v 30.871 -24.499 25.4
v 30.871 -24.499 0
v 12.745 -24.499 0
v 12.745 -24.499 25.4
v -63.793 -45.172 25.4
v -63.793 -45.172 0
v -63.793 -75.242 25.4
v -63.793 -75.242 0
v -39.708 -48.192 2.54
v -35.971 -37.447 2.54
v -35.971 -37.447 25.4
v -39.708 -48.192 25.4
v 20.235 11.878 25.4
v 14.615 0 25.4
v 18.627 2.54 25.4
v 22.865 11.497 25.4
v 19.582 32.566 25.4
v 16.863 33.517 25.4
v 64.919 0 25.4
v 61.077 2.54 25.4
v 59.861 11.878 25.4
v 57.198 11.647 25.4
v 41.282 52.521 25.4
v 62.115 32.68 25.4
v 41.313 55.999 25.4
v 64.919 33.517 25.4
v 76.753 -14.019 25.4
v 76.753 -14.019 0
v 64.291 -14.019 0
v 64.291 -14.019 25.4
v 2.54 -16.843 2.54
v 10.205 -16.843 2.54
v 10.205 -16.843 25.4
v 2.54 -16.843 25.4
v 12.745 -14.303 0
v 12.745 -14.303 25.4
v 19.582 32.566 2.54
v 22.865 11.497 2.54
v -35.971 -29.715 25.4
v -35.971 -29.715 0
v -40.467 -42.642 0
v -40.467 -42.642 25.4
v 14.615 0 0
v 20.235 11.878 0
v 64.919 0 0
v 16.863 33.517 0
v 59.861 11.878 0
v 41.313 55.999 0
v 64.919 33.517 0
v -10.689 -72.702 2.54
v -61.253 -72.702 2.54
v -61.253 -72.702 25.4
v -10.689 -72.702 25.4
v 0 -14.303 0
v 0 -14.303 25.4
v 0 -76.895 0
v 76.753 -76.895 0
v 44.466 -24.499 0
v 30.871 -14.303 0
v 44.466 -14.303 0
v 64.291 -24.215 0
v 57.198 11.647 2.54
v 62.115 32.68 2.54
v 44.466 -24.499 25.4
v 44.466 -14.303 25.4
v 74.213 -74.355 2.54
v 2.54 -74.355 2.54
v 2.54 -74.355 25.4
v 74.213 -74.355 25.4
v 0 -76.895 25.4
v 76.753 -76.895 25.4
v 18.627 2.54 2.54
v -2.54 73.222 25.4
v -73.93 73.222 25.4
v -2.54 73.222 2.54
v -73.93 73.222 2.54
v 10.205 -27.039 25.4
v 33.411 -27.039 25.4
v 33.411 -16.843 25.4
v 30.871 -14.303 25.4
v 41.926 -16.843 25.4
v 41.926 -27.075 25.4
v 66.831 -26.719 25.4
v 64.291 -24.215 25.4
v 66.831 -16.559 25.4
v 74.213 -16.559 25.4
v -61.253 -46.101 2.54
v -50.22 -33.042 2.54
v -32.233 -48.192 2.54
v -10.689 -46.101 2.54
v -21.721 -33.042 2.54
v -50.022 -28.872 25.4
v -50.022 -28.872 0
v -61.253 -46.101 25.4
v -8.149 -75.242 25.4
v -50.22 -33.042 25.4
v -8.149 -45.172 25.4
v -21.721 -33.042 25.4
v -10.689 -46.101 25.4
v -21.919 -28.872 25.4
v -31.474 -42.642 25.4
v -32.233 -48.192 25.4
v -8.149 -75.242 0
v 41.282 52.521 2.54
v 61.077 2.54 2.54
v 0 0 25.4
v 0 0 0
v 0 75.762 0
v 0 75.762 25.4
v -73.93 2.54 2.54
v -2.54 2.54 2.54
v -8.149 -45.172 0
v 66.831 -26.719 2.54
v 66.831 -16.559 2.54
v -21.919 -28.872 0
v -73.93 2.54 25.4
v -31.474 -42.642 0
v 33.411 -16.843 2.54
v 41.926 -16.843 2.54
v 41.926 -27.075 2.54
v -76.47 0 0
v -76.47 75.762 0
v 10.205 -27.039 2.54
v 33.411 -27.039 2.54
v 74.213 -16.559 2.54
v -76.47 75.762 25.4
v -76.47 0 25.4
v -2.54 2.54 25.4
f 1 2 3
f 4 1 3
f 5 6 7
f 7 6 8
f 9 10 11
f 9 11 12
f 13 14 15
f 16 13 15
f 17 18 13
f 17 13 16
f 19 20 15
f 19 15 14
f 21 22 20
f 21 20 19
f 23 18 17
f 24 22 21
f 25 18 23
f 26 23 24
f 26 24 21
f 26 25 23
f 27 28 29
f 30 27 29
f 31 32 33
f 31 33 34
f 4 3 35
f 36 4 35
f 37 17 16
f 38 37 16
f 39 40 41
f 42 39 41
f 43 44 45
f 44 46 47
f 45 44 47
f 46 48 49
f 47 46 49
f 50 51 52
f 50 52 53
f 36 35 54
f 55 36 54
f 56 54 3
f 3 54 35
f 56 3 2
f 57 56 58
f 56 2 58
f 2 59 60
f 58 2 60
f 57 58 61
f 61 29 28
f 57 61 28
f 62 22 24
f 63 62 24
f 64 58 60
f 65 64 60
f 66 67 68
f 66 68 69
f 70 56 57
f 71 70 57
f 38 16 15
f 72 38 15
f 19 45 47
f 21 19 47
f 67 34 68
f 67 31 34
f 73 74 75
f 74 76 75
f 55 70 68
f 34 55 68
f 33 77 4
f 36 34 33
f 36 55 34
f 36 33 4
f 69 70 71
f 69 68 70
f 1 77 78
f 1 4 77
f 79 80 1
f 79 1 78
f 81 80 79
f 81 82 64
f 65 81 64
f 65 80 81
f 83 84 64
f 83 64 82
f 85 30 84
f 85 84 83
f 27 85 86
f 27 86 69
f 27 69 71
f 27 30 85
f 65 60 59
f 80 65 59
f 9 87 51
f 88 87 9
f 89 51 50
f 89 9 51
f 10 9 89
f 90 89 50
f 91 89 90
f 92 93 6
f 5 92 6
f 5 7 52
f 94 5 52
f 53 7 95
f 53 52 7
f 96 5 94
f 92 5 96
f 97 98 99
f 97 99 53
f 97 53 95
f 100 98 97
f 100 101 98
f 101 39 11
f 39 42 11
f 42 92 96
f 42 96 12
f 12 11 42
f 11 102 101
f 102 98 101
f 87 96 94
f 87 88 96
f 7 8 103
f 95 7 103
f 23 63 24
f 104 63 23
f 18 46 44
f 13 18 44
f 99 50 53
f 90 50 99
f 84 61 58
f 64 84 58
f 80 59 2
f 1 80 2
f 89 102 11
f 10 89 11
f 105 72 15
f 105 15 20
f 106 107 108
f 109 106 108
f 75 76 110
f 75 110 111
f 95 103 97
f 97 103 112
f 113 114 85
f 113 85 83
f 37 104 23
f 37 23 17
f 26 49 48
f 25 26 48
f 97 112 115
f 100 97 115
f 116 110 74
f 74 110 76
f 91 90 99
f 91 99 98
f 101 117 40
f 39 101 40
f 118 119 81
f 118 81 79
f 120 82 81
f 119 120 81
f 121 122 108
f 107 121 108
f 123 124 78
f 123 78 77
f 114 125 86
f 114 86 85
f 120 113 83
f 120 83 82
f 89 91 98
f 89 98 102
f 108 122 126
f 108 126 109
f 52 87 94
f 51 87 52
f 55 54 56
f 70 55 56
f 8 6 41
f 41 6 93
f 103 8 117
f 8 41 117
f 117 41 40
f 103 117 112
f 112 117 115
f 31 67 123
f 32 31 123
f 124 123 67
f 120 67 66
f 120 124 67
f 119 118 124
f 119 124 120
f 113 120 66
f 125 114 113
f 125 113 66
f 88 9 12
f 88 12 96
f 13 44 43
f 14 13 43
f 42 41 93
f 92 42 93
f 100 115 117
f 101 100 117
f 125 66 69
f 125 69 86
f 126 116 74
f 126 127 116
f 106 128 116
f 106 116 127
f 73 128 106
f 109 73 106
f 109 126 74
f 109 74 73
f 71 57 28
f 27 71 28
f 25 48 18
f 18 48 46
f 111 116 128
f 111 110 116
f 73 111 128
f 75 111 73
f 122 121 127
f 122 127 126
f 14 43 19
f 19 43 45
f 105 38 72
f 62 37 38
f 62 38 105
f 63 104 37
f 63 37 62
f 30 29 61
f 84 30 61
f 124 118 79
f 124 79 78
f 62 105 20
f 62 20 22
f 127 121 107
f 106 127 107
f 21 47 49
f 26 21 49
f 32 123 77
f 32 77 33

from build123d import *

# Parameters (mm, degrees)
F0_W      = 76.4697343111
F0_H      = 75.7616832852
F1_DEPTH  = 25.4
F2_T      = -2.54
F4_DEPTH  = 25.4
F5_T      = -2.54
F7_DEPTH  = 25.4
F8_T      = -2.54
F10_DEPTH = 25.4
F11_T     = -2.54


with BuildPart() as f1:
    # F0 (on Top) → F1 (new body)
    with BuildSketch(Plane.XY):
        with Locations((-38.2348671556, 37.8808416426)):
            Rectangle(F0_W, F0_H)
    extrude(amount=F1_DEPTH)

    # F2
    f2_openings = [f1.faces().sort_by_distance(p)[0] for p in [
        (-38.234867, 37.880842, 25.4),
    ]]
    offset(amount=F2_T, openings=f2_openings)


with BuildPart() as f4:
    # F3 (on Top) → F4 (new body)
    with BuildSketch(Plane.XY):
        Polygon((0, -27.3308493197), (0, -76.8945664167), (75.3368511796, -76.8945664167), (76.7529606819, -76.8945664167), (76.7529606819, -26.1979643255), (76.7529606819, -14.0194511041), (64.291216433, -14.0194511041), (64.291216433, -24.2154151201), (44.4657355547, -24.4986377656), (44.4657355547, -14.3026728183), (30.8711137623, -14.3026728183), (30.8711137623, -24.4986377656), (12.7449575812, -24.4986377656), (12.7449575812, -14.3026728183), (0, -14.3026728183), align=None)
    extrude(amount=F4_DEPTH)

    # F5
    f5_openings = [f4.faces().sort_by_distance(p)[0] for p in [
        (38.375371, -47.8518, 25.4),
    ]]
    offset(amount=F5_T, openings=f5_openings, kind=Kind.INTERSECTION)


with BuildPart() as f7:
    # F6 (on Top) → F7 (new body)
    with BuildSketch(Plane.XY):
        Polygon((-63.7927651405, -45.1716035604), (-63.7927651405, -75.2418413758), (-35.9707735479, -75.2418413758), (-8.1487819552, -75.2418413758), (-8.1487819552, -45.1716035604), (-21.9192616642, -28.8718529046), (-31.4742922783, -42.6423326135), (-35.9707735479, -29.7149419785), (-40.4672548175, -42.6423326135), (-50.0222854316, -28.8718529046), align=None)
    extrude(amount=F7_DEPTH)

    # F8
    f8_openings = [f7.faces().sort_by_distance(p)[0] for p in [
        (-35.970774, -55.60192, 25.4),
    ]]
    offset(amount=F8_T, openings=f8_openings, kind=Kind.INTERSECTION)


with BuildPart() as f10:
    # F9 (on Top) → F10 (new body)
    with BuildSketch(Plane.XY):
        Polygon((20.2352758497, 11.8775321171), (14.6146714687, 0), (64.9190843105, 0), (59.8605386913, 11.8775321171), (64.9190843105, 33.5168614984), (41.3125418127, 55.9992827475), (16.8629139662, 33.5168614984), align=None)
    extrude(amount=F10_DEPTH)

    # F11
    f11_openings = [f10.faces().sort_by_distance(p)[0] for p in [
        (40.476026, 23.263957, 25.4),
    ]]
    offset(amount=F11_T, openings=f11_openings, kind=Kind.INTERSECTION)


solid = Compound([f1.part, f4.part, f7.part, f10.part])
